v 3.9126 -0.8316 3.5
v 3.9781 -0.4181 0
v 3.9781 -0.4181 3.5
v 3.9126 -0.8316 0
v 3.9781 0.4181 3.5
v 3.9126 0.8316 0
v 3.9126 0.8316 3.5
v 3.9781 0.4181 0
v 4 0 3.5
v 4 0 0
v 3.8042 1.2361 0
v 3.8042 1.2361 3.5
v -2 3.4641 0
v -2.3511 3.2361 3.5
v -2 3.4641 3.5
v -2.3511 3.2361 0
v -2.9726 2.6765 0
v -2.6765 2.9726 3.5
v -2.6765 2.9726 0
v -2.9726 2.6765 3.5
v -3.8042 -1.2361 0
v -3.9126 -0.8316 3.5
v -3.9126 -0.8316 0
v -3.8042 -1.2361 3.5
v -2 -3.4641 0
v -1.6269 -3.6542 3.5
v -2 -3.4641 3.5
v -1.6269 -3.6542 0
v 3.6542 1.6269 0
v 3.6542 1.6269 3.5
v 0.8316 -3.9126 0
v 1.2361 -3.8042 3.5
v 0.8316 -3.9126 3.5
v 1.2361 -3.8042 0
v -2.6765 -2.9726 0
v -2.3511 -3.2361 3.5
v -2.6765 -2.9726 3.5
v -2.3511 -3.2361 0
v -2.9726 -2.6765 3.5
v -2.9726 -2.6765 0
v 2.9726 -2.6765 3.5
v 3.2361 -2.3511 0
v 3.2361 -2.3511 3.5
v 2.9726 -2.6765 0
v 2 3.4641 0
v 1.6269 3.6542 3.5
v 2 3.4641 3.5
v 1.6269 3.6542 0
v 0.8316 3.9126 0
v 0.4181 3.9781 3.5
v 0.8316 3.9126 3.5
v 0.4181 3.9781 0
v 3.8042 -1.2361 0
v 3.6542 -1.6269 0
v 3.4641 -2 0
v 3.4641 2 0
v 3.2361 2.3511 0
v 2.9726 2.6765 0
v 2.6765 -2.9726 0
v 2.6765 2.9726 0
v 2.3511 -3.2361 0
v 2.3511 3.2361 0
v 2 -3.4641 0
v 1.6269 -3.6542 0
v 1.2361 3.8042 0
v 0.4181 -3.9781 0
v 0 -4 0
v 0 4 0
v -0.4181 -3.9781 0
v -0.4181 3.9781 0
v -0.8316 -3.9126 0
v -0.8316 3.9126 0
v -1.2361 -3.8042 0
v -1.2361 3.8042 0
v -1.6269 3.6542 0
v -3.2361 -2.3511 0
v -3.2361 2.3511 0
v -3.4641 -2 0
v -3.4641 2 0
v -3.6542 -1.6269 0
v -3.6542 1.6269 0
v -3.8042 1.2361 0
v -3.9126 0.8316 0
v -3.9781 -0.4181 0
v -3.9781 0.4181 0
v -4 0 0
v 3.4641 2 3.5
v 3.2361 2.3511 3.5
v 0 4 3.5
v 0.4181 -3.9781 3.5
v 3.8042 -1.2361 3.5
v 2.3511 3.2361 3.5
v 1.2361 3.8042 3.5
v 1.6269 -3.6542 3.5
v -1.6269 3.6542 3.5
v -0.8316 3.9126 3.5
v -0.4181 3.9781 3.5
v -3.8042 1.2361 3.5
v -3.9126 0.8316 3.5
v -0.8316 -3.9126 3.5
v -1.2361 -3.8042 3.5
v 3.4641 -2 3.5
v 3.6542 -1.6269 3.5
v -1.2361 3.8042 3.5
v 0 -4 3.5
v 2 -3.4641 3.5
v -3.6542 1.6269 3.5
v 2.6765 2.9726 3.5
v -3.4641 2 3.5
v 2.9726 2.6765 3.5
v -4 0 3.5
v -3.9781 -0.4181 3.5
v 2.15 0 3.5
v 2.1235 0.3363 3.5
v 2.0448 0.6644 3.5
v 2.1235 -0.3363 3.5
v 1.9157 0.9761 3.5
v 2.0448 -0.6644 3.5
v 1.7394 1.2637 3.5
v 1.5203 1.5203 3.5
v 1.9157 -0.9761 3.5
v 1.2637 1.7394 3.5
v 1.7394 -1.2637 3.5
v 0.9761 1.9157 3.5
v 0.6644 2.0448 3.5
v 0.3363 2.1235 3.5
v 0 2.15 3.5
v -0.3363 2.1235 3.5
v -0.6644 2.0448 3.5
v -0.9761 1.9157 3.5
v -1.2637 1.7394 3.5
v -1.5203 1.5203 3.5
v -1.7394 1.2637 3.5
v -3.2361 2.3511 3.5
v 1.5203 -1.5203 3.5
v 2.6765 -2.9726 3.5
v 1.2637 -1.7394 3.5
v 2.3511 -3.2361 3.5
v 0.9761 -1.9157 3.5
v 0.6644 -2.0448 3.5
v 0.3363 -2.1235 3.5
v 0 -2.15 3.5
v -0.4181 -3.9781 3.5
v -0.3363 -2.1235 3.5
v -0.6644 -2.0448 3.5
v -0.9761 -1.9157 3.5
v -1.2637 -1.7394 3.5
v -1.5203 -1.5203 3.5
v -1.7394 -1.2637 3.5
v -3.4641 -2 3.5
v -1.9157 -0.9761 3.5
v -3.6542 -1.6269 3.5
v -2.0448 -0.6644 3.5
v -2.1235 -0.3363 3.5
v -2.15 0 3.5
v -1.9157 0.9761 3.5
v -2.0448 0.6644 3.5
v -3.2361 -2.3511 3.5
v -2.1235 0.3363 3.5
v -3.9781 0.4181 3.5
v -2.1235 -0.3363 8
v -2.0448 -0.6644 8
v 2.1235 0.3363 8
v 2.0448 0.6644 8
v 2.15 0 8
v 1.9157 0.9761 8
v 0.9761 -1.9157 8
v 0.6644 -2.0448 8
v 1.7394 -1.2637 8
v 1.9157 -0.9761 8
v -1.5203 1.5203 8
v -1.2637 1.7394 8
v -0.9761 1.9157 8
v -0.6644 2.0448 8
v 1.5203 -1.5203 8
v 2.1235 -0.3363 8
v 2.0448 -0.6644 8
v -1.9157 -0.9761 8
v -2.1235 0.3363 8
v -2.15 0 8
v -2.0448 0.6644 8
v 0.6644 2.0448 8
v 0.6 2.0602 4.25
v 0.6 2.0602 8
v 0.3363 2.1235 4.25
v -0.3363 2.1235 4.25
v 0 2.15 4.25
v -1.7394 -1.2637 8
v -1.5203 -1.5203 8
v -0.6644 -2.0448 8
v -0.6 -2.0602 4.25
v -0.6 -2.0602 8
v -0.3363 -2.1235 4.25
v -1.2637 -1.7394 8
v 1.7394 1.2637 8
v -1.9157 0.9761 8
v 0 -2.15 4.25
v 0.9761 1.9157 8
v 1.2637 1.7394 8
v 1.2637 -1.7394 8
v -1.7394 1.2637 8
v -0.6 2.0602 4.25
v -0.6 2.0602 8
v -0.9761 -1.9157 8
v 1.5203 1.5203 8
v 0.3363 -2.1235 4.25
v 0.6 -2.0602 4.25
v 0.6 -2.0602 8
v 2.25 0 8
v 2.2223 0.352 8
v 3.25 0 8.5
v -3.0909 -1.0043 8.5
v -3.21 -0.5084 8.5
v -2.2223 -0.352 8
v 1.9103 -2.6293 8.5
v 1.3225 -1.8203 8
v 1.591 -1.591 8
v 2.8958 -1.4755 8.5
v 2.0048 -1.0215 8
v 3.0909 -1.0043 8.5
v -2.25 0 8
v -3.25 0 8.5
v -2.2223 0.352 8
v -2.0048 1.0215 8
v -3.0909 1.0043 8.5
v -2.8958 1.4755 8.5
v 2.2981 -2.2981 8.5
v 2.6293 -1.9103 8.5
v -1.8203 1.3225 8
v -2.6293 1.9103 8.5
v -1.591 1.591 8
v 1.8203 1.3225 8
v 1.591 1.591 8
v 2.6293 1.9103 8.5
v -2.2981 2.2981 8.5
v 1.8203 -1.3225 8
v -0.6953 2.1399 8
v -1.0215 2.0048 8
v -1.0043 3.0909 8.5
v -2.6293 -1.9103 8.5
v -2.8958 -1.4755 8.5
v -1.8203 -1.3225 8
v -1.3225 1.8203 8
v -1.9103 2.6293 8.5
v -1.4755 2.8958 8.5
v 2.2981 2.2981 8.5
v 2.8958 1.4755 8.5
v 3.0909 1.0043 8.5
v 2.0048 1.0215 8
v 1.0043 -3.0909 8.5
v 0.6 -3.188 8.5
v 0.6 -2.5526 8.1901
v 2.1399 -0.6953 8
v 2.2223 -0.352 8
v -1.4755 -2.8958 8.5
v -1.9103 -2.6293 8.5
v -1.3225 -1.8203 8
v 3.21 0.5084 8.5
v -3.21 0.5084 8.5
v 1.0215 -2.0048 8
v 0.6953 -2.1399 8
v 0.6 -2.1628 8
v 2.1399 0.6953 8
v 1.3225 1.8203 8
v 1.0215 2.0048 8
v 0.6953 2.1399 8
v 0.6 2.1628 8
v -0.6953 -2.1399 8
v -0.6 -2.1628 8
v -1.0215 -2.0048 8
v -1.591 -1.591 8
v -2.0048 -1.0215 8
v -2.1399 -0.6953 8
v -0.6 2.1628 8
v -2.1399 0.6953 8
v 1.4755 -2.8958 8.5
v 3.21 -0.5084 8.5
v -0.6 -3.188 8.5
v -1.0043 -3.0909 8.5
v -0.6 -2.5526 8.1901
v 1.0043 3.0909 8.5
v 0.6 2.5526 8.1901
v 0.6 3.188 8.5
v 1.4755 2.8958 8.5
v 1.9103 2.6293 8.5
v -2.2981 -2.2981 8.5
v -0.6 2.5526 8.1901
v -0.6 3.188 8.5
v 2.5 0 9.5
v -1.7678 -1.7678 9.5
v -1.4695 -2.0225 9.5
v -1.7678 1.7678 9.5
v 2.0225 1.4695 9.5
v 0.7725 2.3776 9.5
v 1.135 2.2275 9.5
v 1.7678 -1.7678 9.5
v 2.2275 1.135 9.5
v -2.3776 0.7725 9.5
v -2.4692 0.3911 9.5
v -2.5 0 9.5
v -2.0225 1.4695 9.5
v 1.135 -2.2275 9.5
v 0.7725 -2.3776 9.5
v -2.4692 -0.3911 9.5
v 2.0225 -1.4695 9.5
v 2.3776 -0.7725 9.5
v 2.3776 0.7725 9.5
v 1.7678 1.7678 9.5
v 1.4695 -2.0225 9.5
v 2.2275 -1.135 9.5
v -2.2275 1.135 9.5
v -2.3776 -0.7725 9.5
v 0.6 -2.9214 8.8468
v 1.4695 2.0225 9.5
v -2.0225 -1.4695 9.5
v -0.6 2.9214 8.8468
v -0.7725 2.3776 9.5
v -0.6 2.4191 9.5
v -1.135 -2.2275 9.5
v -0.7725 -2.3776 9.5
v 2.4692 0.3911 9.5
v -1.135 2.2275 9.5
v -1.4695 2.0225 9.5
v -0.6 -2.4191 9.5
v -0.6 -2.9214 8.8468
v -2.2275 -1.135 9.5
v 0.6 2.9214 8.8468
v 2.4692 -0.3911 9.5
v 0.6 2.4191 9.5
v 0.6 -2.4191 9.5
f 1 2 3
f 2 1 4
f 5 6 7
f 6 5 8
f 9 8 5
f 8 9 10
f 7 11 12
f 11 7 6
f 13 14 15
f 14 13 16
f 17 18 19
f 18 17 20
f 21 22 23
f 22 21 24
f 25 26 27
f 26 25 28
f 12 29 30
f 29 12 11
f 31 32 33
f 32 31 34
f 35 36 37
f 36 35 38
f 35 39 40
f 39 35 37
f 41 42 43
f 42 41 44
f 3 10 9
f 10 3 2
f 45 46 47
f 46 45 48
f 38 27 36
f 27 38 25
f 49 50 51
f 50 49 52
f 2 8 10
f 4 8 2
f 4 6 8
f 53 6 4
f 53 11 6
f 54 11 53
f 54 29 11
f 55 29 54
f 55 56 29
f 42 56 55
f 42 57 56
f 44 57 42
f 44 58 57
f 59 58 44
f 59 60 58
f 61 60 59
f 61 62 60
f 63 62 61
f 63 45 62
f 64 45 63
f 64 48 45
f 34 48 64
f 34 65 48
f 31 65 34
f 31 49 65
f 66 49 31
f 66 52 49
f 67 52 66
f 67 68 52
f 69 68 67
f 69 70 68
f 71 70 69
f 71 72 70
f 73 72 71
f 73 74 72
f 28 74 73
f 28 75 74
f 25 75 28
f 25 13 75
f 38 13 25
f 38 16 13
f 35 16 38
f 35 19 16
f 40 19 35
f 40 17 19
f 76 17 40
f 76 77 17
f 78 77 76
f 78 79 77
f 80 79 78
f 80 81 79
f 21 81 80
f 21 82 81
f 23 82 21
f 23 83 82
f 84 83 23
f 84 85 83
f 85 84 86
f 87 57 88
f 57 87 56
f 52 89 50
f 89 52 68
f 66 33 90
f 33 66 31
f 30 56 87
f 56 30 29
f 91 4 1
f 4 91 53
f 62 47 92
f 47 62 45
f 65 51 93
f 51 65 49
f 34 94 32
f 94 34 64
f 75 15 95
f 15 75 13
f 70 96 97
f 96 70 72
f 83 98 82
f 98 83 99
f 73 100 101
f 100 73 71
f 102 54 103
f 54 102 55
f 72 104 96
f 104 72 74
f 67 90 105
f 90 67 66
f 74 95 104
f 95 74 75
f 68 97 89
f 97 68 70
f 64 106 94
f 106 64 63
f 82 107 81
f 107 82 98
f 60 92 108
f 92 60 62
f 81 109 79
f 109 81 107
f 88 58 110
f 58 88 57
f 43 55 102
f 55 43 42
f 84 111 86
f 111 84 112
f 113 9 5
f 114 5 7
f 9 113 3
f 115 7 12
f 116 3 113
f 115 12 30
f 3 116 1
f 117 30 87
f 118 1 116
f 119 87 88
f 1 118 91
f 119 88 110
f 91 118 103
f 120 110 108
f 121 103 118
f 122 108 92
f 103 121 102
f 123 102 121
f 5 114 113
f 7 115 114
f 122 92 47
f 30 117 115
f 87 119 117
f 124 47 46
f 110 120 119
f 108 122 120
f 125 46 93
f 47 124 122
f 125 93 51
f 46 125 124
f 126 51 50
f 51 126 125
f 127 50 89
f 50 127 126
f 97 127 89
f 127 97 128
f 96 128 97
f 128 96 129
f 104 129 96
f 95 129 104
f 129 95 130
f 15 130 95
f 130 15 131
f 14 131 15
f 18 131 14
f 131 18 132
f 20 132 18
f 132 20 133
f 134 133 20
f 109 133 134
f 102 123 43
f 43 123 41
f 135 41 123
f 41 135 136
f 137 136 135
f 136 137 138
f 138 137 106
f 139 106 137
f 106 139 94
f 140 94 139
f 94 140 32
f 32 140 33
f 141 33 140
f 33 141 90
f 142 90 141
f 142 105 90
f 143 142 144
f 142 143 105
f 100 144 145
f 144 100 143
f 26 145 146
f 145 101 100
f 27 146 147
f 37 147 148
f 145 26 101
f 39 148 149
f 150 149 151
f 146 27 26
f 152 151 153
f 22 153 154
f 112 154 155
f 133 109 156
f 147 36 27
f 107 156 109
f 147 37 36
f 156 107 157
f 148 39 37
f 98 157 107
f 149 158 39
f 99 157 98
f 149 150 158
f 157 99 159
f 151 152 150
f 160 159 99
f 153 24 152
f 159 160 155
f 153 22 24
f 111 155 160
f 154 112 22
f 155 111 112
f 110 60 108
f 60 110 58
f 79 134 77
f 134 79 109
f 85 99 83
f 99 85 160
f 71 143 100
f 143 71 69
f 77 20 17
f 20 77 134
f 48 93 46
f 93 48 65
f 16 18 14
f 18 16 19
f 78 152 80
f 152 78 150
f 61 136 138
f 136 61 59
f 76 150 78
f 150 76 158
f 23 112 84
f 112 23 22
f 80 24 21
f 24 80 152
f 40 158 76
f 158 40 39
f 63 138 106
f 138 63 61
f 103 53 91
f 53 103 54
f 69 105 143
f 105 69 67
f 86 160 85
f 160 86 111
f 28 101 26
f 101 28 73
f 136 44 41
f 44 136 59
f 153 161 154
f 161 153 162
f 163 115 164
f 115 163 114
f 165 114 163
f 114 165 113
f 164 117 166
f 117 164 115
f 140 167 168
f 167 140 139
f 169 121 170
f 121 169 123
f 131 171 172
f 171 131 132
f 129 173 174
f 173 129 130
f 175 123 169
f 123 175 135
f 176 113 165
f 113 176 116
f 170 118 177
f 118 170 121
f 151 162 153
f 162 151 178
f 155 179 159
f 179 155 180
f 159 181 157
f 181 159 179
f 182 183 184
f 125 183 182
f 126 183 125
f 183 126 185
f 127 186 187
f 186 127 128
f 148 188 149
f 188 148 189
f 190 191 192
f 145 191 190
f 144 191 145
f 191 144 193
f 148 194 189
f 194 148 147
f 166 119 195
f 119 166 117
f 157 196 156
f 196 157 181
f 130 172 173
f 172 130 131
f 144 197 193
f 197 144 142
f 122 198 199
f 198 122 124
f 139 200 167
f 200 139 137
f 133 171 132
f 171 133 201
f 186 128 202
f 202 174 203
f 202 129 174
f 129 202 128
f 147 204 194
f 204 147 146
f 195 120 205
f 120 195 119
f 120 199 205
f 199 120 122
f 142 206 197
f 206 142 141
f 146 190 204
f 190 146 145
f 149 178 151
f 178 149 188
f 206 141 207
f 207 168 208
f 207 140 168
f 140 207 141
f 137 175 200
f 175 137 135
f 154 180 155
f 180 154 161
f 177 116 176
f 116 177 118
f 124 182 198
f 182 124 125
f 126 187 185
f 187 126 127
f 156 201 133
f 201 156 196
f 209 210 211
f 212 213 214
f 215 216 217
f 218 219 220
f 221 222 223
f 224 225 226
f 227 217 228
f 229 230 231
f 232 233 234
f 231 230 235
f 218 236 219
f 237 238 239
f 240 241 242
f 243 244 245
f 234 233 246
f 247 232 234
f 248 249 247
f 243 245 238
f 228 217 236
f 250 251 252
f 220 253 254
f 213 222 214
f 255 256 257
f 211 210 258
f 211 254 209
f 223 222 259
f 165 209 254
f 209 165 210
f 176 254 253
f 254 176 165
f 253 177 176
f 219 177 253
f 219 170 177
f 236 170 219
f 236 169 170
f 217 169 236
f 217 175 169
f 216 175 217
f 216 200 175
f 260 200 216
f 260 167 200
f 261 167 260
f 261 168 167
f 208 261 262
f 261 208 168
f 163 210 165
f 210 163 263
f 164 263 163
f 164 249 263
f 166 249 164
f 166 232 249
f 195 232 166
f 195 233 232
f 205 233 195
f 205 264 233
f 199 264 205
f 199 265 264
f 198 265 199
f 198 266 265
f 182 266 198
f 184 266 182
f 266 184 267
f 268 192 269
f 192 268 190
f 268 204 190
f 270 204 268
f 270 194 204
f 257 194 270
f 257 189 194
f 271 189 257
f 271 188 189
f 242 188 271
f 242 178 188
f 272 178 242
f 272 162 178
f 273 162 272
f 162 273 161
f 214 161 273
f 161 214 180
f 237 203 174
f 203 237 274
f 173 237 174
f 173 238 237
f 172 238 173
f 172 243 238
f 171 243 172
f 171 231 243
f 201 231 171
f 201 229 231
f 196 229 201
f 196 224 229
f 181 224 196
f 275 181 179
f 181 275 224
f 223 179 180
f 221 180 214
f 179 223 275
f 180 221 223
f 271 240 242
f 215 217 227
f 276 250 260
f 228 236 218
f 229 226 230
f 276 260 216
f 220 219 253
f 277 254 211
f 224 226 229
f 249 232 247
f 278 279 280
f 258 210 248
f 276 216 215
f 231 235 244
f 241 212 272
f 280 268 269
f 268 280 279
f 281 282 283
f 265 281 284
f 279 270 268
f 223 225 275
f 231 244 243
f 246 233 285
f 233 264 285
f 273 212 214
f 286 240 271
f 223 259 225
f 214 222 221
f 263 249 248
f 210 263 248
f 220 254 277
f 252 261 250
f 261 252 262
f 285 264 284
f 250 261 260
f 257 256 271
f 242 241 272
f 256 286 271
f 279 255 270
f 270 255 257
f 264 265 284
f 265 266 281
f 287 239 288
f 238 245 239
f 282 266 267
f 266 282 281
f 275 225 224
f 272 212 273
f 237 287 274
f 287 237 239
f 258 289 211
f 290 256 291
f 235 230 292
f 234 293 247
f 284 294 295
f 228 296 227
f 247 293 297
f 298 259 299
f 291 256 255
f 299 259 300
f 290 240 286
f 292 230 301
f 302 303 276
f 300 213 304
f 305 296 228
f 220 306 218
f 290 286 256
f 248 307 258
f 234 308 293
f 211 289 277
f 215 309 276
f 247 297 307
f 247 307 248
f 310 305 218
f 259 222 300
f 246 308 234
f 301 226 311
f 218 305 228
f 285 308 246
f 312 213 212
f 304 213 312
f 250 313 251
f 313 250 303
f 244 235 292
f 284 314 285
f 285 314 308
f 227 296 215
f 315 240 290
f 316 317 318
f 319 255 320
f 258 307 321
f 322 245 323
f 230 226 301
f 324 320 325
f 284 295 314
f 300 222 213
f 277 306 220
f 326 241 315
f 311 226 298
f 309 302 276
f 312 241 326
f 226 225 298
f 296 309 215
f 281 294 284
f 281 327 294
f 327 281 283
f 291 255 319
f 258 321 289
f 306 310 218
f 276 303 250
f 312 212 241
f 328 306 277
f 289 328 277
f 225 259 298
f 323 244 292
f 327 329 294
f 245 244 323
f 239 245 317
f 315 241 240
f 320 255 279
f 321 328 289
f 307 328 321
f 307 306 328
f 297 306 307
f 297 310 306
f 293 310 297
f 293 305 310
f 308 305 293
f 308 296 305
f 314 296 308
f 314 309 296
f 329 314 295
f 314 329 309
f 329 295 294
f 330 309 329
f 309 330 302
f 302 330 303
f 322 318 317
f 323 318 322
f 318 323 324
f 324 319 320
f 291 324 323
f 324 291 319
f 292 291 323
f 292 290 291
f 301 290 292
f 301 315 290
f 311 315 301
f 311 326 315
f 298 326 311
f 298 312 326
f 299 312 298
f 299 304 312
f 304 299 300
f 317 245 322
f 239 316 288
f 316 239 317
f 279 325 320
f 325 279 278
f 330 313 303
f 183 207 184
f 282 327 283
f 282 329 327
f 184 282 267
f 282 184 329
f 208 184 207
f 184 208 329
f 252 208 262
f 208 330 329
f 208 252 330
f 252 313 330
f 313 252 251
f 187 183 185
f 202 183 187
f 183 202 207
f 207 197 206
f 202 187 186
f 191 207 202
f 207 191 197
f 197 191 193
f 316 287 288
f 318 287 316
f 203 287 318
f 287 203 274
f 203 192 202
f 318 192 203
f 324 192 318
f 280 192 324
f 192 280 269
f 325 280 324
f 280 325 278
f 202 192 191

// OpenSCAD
// Nupsi, passt in ein "8.5" Loch

module radnupsi() {
	difference() {
		union() {
			translate([0,0,0]) cylinder(r=8/2, h=3.5, $fn=60);
			translate([0,0,2.5]) cylinder(r=4.3/2  , h=6, $fn=40);
			translate([0,0,8]) cylinder(r1=4.5/2, r2=6.5/2, h=0.5, $fn=40);
			translate([0,0,8.5]) cylinder(r1=6.5/2, r2=5/2, h=1, $fn=40);
		}
		translate([-0.6, -5, 4.25]) cube(size=[1.2,10,7.6]);
	}
}

module radnupsi_anti() {
	cylinder(h=10, r=8.5/2, center=true, $fn=40);
}

radnupsi();
